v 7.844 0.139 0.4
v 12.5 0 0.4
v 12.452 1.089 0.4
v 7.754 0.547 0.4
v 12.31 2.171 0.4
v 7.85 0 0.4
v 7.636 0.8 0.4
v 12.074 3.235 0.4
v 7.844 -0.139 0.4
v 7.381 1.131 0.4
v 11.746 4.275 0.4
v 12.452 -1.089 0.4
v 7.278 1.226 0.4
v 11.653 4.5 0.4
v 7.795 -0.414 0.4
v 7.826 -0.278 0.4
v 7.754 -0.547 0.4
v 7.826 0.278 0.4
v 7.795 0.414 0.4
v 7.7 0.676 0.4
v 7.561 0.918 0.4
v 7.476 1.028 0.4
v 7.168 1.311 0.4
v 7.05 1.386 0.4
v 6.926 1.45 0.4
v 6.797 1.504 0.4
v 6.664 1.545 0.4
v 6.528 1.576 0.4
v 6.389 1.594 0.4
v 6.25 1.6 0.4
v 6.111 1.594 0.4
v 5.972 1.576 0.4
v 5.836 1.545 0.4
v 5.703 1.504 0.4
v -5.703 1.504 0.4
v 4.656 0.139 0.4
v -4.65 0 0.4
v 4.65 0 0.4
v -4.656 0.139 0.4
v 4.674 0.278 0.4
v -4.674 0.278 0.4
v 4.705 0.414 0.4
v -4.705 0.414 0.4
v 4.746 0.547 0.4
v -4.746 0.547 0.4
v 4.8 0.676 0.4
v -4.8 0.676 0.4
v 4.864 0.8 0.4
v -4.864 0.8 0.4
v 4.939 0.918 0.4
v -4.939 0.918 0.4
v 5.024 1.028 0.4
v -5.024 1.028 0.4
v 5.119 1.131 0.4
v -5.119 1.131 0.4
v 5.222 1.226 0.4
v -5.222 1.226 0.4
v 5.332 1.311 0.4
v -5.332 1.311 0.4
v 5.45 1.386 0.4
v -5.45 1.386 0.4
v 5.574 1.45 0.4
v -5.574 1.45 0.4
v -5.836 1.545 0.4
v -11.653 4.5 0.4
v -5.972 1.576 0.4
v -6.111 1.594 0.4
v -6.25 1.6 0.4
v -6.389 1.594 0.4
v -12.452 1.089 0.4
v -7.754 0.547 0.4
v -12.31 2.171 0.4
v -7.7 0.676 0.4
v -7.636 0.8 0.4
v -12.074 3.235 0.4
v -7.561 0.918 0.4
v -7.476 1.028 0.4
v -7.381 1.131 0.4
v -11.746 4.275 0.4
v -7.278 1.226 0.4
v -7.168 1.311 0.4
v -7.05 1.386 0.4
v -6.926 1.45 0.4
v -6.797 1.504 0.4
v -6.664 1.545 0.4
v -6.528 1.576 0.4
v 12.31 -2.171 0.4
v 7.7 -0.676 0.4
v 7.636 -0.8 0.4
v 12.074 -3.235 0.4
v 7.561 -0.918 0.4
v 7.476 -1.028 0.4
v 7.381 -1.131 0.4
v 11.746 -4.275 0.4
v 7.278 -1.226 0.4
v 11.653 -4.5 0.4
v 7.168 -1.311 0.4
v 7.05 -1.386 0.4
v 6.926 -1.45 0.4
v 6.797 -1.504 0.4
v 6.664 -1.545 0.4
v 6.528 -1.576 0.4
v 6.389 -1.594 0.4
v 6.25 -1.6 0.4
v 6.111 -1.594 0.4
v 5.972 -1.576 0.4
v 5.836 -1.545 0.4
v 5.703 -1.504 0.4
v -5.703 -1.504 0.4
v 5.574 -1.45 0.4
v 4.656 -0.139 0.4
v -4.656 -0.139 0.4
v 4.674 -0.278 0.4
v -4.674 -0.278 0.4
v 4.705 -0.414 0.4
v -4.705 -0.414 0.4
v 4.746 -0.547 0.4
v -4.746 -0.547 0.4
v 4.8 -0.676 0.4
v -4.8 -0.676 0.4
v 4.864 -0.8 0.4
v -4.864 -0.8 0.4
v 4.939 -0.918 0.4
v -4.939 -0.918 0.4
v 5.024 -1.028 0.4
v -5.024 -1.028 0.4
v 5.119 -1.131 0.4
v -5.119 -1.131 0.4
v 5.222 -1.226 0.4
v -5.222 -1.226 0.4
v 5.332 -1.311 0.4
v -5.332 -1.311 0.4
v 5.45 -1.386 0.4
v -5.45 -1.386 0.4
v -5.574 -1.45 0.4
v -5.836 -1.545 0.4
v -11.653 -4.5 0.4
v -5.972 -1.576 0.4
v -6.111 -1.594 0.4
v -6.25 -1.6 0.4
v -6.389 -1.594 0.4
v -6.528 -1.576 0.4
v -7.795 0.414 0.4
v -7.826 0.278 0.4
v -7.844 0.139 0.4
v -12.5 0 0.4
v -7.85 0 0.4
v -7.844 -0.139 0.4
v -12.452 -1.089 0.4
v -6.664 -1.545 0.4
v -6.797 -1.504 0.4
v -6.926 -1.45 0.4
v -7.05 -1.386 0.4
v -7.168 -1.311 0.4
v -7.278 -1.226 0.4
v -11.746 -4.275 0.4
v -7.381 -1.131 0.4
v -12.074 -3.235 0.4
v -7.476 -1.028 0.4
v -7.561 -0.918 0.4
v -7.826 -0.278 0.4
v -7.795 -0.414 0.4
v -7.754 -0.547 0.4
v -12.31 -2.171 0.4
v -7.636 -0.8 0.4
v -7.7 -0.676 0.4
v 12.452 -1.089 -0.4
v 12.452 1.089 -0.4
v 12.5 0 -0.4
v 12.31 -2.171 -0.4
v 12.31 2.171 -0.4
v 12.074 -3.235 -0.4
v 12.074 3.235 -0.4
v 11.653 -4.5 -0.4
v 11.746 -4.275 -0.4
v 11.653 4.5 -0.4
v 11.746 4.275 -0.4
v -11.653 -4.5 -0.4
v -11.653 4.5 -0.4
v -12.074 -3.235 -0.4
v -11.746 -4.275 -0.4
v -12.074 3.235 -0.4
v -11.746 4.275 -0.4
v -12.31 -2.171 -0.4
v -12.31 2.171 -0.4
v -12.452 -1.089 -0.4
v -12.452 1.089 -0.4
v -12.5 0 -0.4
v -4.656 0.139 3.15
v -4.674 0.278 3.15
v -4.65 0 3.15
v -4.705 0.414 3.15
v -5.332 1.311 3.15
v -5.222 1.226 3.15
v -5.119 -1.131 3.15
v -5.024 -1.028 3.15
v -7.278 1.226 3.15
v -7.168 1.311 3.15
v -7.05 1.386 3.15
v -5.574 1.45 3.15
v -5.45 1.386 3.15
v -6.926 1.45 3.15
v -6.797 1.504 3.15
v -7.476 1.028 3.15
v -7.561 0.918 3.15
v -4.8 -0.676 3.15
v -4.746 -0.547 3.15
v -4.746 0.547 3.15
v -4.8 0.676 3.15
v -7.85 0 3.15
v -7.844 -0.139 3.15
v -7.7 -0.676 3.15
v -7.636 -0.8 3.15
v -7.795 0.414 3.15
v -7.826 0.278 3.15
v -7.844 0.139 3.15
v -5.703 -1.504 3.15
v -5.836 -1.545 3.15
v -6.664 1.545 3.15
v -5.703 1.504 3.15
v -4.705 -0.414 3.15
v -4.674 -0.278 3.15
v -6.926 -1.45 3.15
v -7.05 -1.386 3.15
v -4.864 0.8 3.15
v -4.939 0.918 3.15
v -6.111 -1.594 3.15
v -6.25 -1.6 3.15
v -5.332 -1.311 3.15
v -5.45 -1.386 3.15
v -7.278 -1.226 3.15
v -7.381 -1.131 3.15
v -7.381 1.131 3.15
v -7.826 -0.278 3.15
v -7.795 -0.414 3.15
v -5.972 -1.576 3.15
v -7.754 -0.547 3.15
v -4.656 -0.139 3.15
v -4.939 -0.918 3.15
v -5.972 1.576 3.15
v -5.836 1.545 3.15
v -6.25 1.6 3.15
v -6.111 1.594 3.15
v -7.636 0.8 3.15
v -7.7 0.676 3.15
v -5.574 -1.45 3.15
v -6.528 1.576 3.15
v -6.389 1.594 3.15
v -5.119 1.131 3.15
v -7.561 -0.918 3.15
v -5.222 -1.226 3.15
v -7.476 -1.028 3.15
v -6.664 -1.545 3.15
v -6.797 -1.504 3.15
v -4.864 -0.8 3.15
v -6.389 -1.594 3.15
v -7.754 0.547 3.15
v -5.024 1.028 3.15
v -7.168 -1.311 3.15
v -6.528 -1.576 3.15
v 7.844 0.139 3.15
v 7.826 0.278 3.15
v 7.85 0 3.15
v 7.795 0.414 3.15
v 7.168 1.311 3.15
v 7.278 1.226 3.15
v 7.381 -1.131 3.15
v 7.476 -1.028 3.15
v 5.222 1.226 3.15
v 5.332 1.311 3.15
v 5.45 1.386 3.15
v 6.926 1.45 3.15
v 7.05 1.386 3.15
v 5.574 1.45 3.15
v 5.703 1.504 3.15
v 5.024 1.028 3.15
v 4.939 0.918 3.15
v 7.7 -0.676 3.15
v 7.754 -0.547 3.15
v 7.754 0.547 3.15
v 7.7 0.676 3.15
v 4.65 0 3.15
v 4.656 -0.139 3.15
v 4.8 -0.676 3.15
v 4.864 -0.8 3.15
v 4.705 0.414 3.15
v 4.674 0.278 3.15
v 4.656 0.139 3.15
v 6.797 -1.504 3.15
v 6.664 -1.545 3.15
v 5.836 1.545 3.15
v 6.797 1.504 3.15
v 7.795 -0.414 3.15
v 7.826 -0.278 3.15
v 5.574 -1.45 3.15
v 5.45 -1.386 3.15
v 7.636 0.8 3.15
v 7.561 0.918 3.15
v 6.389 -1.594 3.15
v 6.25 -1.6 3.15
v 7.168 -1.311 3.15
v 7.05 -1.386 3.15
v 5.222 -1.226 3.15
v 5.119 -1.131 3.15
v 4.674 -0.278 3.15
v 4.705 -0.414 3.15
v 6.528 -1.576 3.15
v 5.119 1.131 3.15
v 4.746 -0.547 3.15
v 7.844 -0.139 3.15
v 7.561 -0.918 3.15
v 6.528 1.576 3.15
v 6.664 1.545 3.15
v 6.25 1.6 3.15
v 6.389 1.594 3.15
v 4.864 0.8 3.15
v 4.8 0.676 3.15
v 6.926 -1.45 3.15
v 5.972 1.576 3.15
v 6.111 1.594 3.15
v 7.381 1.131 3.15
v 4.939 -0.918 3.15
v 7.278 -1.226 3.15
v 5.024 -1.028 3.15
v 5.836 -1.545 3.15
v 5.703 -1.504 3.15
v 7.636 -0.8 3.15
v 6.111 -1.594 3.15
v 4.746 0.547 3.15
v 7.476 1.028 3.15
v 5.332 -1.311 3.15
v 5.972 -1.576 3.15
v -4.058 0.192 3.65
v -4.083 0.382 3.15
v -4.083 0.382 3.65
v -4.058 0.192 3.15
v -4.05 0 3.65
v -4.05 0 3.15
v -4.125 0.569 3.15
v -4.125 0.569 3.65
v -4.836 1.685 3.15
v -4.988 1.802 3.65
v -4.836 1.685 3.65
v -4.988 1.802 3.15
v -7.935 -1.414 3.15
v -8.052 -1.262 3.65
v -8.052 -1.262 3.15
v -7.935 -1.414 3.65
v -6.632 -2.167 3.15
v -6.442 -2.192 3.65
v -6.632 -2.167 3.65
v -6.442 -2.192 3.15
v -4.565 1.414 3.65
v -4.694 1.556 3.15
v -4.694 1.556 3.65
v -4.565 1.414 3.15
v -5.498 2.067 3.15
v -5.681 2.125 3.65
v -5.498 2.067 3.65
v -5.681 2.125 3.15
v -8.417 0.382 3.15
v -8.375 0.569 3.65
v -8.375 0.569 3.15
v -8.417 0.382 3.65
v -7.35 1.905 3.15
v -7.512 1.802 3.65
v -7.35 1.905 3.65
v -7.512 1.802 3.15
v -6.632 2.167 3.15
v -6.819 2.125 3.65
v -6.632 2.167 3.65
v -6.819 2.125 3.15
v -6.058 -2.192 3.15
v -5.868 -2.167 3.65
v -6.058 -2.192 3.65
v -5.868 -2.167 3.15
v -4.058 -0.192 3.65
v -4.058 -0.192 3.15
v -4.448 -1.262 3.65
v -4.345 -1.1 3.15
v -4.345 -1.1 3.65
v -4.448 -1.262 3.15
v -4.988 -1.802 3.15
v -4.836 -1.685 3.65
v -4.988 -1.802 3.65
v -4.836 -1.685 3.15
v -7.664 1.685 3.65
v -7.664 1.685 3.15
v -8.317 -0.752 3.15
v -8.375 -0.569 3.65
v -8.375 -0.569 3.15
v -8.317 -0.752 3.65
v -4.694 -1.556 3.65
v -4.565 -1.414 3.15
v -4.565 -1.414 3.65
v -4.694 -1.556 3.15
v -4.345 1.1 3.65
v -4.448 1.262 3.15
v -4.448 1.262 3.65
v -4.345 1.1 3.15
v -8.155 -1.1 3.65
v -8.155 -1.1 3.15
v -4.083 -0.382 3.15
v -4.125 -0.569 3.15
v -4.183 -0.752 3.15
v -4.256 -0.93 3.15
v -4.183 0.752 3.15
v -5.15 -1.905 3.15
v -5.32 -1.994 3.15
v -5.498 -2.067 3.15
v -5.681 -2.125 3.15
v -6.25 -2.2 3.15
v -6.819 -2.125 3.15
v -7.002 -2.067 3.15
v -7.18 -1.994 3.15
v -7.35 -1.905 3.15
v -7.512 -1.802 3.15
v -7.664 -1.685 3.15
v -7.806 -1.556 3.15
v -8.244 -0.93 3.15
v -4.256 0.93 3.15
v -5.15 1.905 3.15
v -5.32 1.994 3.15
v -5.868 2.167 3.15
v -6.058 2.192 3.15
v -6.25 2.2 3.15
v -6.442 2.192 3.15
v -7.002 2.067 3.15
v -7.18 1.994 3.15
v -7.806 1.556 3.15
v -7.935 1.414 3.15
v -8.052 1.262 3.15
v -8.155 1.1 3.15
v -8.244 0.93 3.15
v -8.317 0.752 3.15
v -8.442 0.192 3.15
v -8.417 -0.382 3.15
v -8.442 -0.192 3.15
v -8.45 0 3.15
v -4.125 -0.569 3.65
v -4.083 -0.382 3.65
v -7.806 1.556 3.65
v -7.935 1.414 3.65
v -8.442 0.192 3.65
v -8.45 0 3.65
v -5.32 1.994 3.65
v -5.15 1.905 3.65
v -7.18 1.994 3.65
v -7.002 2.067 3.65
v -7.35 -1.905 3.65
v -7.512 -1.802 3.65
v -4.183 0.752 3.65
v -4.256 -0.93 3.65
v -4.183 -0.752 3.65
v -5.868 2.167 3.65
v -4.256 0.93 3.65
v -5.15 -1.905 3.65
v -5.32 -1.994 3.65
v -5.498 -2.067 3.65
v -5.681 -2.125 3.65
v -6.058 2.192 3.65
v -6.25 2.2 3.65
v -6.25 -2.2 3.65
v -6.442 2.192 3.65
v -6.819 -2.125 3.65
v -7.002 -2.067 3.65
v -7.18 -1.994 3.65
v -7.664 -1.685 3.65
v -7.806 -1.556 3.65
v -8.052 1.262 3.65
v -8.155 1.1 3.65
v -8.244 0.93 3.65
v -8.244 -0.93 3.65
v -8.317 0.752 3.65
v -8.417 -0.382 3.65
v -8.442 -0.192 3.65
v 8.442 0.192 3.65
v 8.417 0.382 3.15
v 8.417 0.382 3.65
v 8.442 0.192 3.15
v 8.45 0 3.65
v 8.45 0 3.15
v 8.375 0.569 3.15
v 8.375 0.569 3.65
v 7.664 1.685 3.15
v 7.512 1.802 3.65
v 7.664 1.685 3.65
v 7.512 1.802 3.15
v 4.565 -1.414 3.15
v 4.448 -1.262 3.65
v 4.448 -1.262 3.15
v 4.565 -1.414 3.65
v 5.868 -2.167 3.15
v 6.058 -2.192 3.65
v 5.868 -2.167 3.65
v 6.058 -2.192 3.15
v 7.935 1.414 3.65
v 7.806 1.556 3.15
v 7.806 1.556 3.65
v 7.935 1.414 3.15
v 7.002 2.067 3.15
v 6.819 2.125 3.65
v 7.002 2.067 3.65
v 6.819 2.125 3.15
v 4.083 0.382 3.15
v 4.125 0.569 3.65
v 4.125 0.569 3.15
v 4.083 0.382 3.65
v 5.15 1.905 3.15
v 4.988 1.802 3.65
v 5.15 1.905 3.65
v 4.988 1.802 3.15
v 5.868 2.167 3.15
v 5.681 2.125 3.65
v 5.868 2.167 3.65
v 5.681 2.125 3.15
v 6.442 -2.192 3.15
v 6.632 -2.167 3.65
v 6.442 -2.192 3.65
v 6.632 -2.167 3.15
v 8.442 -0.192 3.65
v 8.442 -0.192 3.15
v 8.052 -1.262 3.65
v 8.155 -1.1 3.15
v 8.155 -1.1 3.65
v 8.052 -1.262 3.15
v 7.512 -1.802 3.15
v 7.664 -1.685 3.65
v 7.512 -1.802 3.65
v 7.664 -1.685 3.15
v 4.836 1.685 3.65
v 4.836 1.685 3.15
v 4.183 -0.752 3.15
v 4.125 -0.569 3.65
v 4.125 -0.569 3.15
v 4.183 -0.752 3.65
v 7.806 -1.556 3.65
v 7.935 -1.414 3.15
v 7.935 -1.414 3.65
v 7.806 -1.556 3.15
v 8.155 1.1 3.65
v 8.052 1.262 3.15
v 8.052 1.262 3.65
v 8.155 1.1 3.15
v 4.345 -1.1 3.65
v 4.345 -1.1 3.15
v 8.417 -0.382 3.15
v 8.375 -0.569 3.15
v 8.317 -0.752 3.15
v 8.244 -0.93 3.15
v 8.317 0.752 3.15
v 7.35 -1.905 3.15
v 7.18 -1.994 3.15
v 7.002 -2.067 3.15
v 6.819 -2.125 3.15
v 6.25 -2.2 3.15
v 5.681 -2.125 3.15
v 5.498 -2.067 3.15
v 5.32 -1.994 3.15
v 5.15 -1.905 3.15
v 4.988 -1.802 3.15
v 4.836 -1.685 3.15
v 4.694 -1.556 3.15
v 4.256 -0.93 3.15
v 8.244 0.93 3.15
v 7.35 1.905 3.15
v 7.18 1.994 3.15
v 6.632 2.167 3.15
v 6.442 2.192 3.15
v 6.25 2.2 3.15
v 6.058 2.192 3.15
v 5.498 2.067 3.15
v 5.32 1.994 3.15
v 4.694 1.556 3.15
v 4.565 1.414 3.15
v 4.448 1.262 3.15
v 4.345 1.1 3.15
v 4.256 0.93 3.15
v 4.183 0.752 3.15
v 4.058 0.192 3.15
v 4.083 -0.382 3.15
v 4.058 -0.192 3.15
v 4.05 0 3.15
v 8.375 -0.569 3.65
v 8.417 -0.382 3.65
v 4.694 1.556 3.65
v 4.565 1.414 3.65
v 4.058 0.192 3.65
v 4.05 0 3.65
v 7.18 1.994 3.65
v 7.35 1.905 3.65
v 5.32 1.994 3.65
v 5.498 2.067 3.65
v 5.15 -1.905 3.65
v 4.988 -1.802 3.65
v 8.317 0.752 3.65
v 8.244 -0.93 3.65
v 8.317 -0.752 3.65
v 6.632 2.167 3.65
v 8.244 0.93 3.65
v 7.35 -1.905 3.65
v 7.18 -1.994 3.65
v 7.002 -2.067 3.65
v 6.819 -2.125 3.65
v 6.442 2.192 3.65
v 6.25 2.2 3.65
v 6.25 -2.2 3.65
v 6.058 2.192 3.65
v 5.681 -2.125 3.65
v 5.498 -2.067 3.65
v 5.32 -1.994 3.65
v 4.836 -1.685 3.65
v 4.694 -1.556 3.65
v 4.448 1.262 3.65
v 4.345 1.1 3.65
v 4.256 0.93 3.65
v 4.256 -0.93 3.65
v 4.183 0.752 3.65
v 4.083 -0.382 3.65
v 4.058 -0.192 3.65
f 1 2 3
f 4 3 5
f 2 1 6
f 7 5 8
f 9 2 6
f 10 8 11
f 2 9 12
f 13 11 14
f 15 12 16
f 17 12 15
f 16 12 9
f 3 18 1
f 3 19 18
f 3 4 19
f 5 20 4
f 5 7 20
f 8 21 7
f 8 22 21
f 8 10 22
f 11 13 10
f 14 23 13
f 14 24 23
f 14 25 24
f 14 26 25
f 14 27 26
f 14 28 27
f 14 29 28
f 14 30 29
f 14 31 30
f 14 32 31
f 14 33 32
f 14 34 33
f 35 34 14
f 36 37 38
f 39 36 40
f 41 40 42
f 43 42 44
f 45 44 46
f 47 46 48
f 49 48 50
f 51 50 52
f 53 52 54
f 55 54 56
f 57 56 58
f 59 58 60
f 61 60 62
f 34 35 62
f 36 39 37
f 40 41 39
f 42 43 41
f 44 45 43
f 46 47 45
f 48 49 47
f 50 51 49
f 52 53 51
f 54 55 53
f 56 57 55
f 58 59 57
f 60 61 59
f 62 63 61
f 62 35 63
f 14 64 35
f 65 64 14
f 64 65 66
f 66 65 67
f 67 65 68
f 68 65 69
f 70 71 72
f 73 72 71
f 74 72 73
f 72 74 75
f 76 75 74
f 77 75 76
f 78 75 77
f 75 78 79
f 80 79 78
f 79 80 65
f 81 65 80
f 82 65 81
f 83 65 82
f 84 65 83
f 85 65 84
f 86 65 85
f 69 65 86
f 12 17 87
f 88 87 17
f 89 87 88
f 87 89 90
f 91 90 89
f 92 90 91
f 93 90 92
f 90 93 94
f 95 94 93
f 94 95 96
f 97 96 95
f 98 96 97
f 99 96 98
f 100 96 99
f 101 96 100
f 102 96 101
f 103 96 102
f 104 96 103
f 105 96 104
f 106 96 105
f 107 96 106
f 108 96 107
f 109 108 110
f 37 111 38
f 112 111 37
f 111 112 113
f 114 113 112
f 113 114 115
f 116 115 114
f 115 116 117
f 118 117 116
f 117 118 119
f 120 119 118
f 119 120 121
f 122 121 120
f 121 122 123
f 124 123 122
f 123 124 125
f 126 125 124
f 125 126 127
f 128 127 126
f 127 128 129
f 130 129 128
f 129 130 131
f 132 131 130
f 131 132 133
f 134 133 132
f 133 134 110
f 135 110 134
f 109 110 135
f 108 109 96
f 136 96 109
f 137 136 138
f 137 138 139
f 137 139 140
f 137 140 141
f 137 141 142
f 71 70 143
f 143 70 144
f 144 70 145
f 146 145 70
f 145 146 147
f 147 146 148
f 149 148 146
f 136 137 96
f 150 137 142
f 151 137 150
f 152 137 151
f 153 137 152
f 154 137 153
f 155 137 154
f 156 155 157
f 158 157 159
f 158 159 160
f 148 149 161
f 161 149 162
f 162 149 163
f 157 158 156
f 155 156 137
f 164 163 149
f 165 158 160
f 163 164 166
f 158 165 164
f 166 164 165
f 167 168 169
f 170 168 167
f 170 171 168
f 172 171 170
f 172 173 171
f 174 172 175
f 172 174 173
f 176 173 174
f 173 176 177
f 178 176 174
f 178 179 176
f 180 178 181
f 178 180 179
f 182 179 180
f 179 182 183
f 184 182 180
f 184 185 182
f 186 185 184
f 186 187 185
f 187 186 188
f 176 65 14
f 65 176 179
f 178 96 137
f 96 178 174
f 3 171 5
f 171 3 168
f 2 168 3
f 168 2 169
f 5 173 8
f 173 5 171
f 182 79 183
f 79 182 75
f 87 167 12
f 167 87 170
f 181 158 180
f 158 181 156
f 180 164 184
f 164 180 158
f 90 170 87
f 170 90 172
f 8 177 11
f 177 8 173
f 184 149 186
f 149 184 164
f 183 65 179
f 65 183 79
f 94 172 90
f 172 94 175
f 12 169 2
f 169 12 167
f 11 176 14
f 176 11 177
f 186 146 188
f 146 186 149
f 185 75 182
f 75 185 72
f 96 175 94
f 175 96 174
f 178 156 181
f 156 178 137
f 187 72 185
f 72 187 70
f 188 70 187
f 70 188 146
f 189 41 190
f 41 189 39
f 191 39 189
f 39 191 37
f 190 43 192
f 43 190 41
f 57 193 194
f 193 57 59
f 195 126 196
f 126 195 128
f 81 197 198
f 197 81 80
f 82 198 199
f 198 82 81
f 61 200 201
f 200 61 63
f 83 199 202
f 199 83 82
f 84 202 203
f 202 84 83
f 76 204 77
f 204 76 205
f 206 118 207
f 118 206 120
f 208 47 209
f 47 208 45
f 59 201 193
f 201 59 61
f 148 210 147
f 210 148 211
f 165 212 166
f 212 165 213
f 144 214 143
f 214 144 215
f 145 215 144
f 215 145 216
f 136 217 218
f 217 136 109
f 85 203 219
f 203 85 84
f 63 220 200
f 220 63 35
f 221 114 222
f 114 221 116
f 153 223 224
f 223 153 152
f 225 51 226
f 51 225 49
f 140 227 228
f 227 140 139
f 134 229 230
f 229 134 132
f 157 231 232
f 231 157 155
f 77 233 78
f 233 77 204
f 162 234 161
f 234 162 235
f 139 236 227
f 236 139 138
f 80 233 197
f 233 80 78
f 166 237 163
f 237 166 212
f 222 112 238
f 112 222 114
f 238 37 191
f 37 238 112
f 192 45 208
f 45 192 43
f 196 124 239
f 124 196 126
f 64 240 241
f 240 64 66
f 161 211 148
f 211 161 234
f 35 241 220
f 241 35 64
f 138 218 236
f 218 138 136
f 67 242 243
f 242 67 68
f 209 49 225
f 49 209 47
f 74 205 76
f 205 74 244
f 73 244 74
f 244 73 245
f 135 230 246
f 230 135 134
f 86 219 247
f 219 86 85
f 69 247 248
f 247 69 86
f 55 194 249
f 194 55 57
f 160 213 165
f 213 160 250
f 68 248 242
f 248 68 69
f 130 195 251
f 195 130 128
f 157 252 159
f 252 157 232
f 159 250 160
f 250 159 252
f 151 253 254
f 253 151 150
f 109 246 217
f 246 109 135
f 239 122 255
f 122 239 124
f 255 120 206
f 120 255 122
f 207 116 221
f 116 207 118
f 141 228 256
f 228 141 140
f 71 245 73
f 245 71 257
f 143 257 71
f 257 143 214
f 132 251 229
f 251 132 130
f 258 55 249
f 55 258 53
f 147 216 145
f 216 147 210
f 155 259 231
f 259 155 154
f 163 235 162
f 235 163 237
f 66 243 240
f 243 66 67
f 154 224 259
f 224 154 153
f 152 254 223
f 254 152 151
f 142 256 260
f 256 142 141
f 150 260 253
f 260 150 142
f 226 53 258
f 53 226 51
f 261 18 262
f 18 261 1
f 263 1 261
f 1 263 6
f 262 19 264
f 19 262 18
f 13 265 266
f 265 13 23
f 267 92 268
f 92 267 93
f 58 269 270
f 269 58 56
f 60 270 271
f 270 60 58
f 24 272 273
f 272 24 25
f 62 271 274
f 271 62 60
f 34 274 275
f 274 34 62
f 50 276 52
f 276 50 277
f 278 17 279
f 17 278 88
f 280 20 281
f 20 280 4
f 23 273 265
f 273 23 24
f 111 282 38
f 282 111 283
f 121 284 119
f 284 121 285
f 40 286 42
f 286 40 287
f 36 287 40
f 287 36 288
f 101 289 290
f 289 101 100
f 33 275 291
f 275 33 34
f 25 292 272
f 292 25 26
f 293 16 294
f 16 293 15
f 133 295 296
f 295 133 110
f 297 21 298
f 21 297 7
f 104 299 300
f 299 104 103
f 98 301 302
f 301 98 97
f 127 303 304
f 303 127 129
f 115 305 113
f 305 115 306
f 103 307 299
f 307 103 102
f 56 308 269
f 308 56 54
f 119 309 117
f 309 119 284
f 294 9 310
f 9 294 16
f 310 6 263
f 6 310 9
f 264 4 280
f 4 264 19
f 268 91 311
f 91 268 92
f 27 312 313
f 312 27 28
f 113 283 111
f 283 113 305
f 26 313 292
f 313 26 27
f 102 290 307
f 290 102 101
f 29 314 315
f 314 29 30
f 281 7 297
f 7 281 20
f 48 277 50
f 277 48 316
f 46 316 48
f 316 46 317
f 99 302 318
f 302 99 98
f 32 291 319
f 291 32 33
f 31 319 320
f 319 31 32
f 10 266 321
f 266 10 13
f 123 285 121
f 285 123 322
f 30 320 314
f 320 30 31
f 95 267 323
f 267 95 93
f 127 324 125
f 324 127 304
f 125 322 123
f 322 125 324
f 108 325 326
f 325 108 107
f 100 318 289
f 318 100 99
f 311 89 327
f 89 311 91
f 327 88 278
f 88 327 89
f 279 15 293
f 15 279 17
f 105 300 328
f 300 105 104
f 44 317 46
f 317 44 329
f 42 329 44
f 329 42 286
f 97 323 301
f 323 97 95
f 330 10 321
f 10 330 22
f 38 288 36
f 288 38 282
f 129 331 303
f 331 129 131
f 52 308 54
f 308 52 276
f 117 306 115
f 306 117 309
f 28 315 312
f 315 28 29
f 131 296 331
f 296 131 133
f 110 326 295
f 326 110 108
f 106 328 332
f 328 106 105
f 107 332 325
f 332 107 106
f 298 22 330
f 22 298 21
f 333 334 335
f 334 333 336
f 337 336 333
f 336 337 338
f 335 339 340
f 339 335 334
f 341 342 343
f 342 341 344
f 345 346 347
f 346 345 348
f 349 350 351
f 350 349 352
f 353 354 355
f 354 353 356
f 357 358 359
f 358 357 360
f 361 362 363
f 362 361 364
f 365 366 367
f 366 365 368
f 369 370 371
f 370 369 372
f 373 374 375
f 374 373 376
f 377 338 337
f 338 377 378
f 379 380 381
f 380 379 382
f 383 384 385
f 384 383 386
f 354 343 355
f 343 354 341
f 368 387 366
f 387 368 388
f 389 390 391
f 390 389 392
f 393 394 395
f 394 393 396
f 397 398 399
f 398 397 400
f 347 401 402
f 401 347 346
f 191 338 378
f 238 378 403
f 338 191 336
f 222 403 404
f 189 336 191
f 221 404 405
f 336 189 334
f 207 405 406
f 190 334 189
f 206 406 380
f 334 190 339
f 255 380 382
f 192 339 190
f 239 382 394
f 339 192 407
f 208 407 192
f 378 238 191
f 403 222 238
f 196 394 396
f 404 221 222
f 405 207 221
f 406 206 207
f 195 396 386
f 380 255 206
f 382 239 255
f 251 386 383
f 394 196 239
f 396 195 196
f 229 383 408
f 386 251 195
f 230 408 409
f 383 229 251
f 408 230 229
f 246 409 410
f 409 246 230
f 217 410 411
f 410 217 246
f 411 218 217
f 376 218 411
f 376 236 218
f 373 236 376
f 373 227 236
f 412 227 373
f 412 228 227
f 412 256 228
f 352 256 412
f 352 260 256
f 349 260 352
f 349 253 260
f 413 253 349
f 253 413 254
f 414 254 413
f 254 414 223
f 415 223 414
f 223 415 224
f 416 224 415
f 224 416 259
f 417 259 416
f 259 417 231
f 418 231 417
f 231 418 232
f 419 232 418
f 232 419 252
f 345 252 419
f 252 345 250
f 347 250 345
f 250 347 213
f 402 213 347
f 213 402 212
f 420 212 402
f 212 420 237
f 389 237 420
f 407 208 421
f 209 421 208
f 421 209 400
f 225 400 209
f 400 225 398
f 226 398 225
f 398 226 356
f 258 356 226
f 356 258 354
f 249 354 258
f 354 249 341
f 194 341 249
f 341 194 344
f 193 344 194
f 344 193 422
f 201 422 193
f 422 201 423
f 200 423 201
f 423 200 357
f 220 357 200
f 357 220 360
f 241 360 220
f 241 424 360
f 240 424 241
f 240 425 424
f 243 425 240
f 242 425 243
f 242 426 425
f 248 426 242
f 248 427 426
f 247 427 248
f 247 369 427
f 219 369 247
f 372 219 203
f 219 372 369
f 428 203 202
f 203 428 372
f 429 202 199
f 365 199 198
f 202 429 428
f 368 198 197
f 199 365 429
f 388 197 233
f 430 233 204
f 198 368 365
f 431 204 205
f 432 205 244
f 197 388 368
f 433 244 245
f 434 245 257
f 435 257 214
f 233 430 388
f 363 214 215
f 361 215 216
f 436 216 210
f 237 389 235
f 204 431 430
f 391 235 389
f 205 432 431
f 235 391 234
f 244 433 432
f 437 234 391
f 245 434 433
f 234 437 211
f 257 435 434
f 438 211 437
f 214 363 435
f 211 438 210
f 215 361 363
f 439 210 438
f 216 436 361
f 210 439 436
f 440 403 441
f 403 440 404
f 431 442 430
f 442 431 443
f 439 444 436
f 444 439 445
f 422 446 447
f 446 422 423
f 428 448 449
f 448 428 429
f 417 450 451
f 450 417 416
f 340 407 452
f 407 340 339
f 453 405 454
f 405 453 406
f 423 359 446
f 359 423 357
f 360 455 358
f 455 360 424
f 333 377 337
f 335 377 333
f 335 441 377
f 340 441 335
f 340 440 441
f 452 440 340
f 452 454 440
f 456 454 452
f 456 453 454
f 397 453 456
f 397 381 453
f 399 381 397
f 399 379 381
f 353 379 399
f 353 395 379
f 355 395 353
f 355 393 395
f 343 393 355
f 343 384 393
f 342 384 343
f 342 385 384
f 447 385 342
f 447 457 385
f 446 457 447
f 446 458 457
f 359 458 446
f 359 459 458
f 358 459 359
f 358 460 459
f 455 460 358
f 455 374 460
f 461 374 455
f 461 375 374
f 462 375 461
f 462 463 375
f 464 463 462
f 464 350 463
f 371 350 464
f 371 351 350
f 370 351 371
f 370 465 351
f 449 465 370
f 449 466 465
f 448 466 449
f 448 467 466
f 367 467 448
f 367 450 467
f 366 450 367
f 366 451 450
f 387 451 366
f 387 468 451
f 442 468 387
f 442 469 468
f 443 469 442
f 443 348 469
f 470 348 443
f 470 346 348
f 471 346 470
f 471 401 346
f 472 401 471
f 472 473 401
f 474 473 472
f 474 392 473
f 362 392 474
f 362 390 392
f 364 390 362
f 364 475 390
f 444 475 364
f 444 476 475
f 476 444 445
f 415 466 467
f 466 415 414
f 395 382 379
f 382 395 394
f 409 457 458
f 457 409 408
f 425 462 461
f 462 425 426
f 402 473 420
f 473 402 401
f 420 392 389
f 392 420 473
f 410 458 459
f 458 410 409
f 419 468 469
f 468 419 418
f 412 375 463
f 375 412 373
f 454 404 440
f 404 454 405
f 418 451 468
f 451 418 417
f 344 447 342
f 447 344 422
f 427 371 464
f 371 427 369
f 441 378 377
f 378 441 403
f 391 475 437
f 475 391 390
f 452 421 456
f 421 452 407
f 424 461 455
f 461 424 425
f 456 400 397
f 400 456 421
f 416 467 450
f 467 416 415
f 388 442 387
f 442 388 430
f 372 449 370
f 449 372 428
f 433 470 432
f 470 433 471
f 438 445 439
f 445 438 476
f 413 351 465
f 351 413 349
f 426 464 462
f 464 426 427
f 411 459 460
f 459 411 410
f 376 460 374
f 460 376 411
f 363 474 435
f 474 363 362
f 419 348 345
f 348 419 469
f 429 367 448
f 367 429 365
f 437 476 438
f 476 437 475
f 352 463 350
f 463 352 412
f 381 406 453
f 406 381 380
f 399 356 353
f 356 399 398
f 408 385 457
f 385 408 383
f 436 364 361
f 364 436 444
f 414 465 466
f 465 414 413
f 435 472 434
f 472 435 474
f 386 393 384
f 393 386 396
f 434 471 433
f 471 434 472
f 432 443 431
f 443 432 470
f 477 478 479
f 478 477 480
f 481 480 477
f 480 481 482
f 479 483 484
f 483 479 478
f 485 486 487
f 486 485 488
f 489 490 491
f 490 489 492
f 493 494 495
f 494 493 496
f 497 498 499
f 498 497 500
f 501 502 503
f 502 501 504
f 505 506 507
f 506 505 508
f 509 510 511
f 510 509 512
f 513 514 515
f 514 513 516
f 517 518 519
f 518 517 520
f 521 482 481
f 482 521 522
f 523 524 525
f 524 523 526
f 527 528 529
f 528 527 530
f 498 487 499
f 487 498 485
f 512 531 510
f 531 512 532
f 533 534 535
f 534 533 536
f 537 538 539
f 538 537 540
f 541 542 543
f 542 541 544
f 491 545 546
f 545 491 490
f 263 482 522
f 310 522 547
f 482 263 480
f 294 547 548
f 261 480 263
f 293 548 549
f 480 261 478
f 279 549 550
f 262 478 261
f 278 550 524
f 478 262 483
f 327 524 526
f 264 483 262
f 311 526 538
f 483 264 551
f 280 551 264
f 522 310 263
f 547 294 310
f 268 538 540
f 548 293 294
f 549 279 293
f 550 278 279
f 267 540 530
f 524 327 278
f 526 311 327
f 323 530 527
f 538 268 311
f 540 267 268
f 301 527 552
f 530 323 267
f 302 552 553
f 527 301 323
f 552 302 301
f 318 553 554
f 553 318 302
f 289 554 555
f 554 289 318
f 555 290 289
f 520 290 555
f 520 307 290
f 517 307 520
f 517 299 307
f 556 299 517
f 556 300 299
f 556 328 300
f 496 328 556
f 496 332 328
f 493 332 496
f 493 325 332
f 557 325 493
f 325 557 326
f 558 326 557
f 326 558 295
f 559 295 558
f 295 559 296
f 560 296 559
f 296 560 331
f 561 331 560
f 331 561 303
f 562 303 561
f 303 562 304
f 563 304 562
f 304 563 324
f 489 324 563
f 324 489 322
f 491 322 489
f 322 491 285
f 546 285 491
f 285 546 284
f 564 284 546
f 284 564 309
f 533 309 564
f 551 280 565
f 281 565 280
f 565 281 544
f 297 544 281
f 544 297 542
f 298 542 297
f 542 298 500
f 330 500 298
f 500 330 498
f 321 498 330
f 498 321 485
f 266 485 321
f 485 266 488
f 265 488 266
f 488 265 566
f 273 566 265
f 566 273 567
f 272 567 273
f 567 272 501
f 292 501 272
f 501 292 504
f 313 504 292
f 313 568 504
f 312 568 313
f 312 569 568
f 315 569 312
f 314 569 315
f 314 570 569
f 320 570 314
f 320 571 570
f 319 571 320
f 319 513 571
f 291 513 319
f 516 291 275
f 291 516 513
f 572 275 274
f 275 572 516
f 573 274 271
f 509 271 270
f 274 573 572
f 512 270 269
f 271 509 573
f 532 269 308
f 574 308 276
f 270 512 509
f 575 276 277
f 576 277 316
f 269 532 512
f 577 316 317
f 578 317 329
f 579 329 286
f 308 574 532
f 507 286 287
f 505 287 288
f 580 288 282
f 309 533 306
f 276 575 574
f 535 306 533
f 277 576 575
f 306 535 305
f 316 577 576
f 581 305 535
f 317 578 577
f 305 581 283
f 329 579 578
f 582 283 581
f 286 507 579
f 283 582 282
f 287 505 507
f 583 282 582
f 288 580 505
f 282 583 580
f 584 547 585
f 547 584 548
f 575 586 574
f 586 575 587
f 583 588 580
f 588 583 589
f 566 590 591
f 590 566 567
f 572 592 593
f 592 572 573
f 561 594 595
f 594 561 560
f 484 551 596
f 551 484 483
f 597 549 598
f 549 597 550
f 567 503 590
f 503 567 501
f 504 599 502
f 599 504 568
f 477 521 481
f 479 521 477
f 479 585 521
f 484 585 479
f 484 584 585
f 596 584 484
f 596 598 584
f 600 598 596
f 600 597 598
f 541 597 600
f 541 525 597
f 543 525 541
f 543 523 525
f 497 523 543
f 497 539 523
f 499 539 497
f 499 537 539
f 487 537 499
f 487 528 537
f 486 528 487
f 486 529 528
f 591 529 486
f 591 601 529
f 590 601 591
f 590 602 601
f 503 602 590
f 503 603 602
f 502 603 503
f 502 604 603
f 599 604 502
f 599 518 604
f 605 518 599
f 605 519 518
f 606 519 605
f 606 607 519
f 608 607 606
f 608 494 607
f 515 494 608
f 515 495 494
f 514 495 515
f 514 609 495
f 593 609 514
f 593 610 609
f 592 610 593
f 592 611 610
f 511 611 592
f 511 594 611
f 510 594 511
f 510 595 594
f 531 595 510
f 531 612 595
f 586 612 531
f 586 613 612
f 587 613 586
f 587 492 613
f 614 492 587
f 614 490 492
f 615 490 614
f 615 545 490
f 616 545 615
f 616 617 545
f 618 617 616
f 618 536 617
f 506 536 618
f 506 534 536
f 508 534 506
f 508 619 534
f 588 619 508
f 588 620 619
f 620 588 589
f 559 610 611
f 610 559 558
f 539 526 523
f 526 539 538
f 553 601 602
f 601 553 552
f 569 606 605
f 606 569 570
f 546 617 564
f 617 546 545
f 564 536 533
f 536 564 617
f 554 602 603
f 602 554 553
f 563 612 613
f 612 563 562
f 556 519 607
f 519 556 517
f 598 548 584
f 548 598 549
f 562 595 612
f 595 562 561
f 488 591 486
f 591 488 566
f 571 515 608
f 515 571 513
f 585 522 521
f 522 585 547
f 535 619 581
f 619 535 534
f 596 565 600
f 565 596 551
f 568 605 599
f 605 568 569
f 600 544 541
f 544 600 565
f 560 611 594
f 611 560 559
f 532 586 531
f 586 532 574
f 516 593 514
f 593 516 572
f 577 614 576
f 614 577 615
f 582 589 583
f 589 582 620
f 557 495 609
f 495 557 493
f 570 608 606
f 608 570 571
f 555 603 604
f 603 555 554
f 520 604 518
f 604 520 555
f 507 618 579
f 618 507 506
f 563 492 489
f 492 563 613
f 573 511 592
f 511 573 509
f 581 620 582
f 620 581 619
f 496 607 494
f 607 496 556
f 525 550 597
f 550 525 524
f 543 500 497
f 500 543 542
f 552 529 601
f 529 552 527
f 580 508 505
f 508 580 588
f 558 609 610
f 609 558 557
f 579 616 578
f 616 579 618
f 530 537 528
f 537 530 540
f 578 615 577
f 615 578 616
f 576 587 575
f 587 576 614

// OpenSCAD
// belt hook

// Global resolution
$fs = 0.1;  // Don't generate smaller facets than 0.1 mm
$fa = 5;    // Don't generate larger angles than 5 degrees

// Main variable
belt_height = 9.00;
hook_length = 25.00;

hole_radius = 1.60;
hole_depth = 3.00;
thickness = 0.80;


// Main geometry
belt_hook();

// Core geometric primitives.

module belt_hook() {
    union() {
        intersection() {
            color("Cyan") translate([0,0,0]) cube([hook_length,belt_height,thickness], center=true);
            cylinder(h=thickness+1,r=hook_length/2,center=true);
        }
        color("Magenta") translate([-hook_length/4,0,hole_depth/2+thickness/2]) cylinder(h=hole_depth,r=hole_radius,center=true);
        color("Magenta") translate([hook_length/4,0,,hole_depth/2+thickness/2]) cylinder(h=hole_depth,r=hole_radius,center=true);
        color("Pink") translate([-hook_length/4,0,,hole_depth/2+thickness/2+hole_depth/2]) cylinder(h=0.5,r=hole_radius+0.6,center=true);
        color("Pink") translate([hook_length/4,0,,hole_depth/2+thickness/2+hole_depth/2]) cylinder(h=0.5,r=hole_radius+0.6,center=true);
    }
}
